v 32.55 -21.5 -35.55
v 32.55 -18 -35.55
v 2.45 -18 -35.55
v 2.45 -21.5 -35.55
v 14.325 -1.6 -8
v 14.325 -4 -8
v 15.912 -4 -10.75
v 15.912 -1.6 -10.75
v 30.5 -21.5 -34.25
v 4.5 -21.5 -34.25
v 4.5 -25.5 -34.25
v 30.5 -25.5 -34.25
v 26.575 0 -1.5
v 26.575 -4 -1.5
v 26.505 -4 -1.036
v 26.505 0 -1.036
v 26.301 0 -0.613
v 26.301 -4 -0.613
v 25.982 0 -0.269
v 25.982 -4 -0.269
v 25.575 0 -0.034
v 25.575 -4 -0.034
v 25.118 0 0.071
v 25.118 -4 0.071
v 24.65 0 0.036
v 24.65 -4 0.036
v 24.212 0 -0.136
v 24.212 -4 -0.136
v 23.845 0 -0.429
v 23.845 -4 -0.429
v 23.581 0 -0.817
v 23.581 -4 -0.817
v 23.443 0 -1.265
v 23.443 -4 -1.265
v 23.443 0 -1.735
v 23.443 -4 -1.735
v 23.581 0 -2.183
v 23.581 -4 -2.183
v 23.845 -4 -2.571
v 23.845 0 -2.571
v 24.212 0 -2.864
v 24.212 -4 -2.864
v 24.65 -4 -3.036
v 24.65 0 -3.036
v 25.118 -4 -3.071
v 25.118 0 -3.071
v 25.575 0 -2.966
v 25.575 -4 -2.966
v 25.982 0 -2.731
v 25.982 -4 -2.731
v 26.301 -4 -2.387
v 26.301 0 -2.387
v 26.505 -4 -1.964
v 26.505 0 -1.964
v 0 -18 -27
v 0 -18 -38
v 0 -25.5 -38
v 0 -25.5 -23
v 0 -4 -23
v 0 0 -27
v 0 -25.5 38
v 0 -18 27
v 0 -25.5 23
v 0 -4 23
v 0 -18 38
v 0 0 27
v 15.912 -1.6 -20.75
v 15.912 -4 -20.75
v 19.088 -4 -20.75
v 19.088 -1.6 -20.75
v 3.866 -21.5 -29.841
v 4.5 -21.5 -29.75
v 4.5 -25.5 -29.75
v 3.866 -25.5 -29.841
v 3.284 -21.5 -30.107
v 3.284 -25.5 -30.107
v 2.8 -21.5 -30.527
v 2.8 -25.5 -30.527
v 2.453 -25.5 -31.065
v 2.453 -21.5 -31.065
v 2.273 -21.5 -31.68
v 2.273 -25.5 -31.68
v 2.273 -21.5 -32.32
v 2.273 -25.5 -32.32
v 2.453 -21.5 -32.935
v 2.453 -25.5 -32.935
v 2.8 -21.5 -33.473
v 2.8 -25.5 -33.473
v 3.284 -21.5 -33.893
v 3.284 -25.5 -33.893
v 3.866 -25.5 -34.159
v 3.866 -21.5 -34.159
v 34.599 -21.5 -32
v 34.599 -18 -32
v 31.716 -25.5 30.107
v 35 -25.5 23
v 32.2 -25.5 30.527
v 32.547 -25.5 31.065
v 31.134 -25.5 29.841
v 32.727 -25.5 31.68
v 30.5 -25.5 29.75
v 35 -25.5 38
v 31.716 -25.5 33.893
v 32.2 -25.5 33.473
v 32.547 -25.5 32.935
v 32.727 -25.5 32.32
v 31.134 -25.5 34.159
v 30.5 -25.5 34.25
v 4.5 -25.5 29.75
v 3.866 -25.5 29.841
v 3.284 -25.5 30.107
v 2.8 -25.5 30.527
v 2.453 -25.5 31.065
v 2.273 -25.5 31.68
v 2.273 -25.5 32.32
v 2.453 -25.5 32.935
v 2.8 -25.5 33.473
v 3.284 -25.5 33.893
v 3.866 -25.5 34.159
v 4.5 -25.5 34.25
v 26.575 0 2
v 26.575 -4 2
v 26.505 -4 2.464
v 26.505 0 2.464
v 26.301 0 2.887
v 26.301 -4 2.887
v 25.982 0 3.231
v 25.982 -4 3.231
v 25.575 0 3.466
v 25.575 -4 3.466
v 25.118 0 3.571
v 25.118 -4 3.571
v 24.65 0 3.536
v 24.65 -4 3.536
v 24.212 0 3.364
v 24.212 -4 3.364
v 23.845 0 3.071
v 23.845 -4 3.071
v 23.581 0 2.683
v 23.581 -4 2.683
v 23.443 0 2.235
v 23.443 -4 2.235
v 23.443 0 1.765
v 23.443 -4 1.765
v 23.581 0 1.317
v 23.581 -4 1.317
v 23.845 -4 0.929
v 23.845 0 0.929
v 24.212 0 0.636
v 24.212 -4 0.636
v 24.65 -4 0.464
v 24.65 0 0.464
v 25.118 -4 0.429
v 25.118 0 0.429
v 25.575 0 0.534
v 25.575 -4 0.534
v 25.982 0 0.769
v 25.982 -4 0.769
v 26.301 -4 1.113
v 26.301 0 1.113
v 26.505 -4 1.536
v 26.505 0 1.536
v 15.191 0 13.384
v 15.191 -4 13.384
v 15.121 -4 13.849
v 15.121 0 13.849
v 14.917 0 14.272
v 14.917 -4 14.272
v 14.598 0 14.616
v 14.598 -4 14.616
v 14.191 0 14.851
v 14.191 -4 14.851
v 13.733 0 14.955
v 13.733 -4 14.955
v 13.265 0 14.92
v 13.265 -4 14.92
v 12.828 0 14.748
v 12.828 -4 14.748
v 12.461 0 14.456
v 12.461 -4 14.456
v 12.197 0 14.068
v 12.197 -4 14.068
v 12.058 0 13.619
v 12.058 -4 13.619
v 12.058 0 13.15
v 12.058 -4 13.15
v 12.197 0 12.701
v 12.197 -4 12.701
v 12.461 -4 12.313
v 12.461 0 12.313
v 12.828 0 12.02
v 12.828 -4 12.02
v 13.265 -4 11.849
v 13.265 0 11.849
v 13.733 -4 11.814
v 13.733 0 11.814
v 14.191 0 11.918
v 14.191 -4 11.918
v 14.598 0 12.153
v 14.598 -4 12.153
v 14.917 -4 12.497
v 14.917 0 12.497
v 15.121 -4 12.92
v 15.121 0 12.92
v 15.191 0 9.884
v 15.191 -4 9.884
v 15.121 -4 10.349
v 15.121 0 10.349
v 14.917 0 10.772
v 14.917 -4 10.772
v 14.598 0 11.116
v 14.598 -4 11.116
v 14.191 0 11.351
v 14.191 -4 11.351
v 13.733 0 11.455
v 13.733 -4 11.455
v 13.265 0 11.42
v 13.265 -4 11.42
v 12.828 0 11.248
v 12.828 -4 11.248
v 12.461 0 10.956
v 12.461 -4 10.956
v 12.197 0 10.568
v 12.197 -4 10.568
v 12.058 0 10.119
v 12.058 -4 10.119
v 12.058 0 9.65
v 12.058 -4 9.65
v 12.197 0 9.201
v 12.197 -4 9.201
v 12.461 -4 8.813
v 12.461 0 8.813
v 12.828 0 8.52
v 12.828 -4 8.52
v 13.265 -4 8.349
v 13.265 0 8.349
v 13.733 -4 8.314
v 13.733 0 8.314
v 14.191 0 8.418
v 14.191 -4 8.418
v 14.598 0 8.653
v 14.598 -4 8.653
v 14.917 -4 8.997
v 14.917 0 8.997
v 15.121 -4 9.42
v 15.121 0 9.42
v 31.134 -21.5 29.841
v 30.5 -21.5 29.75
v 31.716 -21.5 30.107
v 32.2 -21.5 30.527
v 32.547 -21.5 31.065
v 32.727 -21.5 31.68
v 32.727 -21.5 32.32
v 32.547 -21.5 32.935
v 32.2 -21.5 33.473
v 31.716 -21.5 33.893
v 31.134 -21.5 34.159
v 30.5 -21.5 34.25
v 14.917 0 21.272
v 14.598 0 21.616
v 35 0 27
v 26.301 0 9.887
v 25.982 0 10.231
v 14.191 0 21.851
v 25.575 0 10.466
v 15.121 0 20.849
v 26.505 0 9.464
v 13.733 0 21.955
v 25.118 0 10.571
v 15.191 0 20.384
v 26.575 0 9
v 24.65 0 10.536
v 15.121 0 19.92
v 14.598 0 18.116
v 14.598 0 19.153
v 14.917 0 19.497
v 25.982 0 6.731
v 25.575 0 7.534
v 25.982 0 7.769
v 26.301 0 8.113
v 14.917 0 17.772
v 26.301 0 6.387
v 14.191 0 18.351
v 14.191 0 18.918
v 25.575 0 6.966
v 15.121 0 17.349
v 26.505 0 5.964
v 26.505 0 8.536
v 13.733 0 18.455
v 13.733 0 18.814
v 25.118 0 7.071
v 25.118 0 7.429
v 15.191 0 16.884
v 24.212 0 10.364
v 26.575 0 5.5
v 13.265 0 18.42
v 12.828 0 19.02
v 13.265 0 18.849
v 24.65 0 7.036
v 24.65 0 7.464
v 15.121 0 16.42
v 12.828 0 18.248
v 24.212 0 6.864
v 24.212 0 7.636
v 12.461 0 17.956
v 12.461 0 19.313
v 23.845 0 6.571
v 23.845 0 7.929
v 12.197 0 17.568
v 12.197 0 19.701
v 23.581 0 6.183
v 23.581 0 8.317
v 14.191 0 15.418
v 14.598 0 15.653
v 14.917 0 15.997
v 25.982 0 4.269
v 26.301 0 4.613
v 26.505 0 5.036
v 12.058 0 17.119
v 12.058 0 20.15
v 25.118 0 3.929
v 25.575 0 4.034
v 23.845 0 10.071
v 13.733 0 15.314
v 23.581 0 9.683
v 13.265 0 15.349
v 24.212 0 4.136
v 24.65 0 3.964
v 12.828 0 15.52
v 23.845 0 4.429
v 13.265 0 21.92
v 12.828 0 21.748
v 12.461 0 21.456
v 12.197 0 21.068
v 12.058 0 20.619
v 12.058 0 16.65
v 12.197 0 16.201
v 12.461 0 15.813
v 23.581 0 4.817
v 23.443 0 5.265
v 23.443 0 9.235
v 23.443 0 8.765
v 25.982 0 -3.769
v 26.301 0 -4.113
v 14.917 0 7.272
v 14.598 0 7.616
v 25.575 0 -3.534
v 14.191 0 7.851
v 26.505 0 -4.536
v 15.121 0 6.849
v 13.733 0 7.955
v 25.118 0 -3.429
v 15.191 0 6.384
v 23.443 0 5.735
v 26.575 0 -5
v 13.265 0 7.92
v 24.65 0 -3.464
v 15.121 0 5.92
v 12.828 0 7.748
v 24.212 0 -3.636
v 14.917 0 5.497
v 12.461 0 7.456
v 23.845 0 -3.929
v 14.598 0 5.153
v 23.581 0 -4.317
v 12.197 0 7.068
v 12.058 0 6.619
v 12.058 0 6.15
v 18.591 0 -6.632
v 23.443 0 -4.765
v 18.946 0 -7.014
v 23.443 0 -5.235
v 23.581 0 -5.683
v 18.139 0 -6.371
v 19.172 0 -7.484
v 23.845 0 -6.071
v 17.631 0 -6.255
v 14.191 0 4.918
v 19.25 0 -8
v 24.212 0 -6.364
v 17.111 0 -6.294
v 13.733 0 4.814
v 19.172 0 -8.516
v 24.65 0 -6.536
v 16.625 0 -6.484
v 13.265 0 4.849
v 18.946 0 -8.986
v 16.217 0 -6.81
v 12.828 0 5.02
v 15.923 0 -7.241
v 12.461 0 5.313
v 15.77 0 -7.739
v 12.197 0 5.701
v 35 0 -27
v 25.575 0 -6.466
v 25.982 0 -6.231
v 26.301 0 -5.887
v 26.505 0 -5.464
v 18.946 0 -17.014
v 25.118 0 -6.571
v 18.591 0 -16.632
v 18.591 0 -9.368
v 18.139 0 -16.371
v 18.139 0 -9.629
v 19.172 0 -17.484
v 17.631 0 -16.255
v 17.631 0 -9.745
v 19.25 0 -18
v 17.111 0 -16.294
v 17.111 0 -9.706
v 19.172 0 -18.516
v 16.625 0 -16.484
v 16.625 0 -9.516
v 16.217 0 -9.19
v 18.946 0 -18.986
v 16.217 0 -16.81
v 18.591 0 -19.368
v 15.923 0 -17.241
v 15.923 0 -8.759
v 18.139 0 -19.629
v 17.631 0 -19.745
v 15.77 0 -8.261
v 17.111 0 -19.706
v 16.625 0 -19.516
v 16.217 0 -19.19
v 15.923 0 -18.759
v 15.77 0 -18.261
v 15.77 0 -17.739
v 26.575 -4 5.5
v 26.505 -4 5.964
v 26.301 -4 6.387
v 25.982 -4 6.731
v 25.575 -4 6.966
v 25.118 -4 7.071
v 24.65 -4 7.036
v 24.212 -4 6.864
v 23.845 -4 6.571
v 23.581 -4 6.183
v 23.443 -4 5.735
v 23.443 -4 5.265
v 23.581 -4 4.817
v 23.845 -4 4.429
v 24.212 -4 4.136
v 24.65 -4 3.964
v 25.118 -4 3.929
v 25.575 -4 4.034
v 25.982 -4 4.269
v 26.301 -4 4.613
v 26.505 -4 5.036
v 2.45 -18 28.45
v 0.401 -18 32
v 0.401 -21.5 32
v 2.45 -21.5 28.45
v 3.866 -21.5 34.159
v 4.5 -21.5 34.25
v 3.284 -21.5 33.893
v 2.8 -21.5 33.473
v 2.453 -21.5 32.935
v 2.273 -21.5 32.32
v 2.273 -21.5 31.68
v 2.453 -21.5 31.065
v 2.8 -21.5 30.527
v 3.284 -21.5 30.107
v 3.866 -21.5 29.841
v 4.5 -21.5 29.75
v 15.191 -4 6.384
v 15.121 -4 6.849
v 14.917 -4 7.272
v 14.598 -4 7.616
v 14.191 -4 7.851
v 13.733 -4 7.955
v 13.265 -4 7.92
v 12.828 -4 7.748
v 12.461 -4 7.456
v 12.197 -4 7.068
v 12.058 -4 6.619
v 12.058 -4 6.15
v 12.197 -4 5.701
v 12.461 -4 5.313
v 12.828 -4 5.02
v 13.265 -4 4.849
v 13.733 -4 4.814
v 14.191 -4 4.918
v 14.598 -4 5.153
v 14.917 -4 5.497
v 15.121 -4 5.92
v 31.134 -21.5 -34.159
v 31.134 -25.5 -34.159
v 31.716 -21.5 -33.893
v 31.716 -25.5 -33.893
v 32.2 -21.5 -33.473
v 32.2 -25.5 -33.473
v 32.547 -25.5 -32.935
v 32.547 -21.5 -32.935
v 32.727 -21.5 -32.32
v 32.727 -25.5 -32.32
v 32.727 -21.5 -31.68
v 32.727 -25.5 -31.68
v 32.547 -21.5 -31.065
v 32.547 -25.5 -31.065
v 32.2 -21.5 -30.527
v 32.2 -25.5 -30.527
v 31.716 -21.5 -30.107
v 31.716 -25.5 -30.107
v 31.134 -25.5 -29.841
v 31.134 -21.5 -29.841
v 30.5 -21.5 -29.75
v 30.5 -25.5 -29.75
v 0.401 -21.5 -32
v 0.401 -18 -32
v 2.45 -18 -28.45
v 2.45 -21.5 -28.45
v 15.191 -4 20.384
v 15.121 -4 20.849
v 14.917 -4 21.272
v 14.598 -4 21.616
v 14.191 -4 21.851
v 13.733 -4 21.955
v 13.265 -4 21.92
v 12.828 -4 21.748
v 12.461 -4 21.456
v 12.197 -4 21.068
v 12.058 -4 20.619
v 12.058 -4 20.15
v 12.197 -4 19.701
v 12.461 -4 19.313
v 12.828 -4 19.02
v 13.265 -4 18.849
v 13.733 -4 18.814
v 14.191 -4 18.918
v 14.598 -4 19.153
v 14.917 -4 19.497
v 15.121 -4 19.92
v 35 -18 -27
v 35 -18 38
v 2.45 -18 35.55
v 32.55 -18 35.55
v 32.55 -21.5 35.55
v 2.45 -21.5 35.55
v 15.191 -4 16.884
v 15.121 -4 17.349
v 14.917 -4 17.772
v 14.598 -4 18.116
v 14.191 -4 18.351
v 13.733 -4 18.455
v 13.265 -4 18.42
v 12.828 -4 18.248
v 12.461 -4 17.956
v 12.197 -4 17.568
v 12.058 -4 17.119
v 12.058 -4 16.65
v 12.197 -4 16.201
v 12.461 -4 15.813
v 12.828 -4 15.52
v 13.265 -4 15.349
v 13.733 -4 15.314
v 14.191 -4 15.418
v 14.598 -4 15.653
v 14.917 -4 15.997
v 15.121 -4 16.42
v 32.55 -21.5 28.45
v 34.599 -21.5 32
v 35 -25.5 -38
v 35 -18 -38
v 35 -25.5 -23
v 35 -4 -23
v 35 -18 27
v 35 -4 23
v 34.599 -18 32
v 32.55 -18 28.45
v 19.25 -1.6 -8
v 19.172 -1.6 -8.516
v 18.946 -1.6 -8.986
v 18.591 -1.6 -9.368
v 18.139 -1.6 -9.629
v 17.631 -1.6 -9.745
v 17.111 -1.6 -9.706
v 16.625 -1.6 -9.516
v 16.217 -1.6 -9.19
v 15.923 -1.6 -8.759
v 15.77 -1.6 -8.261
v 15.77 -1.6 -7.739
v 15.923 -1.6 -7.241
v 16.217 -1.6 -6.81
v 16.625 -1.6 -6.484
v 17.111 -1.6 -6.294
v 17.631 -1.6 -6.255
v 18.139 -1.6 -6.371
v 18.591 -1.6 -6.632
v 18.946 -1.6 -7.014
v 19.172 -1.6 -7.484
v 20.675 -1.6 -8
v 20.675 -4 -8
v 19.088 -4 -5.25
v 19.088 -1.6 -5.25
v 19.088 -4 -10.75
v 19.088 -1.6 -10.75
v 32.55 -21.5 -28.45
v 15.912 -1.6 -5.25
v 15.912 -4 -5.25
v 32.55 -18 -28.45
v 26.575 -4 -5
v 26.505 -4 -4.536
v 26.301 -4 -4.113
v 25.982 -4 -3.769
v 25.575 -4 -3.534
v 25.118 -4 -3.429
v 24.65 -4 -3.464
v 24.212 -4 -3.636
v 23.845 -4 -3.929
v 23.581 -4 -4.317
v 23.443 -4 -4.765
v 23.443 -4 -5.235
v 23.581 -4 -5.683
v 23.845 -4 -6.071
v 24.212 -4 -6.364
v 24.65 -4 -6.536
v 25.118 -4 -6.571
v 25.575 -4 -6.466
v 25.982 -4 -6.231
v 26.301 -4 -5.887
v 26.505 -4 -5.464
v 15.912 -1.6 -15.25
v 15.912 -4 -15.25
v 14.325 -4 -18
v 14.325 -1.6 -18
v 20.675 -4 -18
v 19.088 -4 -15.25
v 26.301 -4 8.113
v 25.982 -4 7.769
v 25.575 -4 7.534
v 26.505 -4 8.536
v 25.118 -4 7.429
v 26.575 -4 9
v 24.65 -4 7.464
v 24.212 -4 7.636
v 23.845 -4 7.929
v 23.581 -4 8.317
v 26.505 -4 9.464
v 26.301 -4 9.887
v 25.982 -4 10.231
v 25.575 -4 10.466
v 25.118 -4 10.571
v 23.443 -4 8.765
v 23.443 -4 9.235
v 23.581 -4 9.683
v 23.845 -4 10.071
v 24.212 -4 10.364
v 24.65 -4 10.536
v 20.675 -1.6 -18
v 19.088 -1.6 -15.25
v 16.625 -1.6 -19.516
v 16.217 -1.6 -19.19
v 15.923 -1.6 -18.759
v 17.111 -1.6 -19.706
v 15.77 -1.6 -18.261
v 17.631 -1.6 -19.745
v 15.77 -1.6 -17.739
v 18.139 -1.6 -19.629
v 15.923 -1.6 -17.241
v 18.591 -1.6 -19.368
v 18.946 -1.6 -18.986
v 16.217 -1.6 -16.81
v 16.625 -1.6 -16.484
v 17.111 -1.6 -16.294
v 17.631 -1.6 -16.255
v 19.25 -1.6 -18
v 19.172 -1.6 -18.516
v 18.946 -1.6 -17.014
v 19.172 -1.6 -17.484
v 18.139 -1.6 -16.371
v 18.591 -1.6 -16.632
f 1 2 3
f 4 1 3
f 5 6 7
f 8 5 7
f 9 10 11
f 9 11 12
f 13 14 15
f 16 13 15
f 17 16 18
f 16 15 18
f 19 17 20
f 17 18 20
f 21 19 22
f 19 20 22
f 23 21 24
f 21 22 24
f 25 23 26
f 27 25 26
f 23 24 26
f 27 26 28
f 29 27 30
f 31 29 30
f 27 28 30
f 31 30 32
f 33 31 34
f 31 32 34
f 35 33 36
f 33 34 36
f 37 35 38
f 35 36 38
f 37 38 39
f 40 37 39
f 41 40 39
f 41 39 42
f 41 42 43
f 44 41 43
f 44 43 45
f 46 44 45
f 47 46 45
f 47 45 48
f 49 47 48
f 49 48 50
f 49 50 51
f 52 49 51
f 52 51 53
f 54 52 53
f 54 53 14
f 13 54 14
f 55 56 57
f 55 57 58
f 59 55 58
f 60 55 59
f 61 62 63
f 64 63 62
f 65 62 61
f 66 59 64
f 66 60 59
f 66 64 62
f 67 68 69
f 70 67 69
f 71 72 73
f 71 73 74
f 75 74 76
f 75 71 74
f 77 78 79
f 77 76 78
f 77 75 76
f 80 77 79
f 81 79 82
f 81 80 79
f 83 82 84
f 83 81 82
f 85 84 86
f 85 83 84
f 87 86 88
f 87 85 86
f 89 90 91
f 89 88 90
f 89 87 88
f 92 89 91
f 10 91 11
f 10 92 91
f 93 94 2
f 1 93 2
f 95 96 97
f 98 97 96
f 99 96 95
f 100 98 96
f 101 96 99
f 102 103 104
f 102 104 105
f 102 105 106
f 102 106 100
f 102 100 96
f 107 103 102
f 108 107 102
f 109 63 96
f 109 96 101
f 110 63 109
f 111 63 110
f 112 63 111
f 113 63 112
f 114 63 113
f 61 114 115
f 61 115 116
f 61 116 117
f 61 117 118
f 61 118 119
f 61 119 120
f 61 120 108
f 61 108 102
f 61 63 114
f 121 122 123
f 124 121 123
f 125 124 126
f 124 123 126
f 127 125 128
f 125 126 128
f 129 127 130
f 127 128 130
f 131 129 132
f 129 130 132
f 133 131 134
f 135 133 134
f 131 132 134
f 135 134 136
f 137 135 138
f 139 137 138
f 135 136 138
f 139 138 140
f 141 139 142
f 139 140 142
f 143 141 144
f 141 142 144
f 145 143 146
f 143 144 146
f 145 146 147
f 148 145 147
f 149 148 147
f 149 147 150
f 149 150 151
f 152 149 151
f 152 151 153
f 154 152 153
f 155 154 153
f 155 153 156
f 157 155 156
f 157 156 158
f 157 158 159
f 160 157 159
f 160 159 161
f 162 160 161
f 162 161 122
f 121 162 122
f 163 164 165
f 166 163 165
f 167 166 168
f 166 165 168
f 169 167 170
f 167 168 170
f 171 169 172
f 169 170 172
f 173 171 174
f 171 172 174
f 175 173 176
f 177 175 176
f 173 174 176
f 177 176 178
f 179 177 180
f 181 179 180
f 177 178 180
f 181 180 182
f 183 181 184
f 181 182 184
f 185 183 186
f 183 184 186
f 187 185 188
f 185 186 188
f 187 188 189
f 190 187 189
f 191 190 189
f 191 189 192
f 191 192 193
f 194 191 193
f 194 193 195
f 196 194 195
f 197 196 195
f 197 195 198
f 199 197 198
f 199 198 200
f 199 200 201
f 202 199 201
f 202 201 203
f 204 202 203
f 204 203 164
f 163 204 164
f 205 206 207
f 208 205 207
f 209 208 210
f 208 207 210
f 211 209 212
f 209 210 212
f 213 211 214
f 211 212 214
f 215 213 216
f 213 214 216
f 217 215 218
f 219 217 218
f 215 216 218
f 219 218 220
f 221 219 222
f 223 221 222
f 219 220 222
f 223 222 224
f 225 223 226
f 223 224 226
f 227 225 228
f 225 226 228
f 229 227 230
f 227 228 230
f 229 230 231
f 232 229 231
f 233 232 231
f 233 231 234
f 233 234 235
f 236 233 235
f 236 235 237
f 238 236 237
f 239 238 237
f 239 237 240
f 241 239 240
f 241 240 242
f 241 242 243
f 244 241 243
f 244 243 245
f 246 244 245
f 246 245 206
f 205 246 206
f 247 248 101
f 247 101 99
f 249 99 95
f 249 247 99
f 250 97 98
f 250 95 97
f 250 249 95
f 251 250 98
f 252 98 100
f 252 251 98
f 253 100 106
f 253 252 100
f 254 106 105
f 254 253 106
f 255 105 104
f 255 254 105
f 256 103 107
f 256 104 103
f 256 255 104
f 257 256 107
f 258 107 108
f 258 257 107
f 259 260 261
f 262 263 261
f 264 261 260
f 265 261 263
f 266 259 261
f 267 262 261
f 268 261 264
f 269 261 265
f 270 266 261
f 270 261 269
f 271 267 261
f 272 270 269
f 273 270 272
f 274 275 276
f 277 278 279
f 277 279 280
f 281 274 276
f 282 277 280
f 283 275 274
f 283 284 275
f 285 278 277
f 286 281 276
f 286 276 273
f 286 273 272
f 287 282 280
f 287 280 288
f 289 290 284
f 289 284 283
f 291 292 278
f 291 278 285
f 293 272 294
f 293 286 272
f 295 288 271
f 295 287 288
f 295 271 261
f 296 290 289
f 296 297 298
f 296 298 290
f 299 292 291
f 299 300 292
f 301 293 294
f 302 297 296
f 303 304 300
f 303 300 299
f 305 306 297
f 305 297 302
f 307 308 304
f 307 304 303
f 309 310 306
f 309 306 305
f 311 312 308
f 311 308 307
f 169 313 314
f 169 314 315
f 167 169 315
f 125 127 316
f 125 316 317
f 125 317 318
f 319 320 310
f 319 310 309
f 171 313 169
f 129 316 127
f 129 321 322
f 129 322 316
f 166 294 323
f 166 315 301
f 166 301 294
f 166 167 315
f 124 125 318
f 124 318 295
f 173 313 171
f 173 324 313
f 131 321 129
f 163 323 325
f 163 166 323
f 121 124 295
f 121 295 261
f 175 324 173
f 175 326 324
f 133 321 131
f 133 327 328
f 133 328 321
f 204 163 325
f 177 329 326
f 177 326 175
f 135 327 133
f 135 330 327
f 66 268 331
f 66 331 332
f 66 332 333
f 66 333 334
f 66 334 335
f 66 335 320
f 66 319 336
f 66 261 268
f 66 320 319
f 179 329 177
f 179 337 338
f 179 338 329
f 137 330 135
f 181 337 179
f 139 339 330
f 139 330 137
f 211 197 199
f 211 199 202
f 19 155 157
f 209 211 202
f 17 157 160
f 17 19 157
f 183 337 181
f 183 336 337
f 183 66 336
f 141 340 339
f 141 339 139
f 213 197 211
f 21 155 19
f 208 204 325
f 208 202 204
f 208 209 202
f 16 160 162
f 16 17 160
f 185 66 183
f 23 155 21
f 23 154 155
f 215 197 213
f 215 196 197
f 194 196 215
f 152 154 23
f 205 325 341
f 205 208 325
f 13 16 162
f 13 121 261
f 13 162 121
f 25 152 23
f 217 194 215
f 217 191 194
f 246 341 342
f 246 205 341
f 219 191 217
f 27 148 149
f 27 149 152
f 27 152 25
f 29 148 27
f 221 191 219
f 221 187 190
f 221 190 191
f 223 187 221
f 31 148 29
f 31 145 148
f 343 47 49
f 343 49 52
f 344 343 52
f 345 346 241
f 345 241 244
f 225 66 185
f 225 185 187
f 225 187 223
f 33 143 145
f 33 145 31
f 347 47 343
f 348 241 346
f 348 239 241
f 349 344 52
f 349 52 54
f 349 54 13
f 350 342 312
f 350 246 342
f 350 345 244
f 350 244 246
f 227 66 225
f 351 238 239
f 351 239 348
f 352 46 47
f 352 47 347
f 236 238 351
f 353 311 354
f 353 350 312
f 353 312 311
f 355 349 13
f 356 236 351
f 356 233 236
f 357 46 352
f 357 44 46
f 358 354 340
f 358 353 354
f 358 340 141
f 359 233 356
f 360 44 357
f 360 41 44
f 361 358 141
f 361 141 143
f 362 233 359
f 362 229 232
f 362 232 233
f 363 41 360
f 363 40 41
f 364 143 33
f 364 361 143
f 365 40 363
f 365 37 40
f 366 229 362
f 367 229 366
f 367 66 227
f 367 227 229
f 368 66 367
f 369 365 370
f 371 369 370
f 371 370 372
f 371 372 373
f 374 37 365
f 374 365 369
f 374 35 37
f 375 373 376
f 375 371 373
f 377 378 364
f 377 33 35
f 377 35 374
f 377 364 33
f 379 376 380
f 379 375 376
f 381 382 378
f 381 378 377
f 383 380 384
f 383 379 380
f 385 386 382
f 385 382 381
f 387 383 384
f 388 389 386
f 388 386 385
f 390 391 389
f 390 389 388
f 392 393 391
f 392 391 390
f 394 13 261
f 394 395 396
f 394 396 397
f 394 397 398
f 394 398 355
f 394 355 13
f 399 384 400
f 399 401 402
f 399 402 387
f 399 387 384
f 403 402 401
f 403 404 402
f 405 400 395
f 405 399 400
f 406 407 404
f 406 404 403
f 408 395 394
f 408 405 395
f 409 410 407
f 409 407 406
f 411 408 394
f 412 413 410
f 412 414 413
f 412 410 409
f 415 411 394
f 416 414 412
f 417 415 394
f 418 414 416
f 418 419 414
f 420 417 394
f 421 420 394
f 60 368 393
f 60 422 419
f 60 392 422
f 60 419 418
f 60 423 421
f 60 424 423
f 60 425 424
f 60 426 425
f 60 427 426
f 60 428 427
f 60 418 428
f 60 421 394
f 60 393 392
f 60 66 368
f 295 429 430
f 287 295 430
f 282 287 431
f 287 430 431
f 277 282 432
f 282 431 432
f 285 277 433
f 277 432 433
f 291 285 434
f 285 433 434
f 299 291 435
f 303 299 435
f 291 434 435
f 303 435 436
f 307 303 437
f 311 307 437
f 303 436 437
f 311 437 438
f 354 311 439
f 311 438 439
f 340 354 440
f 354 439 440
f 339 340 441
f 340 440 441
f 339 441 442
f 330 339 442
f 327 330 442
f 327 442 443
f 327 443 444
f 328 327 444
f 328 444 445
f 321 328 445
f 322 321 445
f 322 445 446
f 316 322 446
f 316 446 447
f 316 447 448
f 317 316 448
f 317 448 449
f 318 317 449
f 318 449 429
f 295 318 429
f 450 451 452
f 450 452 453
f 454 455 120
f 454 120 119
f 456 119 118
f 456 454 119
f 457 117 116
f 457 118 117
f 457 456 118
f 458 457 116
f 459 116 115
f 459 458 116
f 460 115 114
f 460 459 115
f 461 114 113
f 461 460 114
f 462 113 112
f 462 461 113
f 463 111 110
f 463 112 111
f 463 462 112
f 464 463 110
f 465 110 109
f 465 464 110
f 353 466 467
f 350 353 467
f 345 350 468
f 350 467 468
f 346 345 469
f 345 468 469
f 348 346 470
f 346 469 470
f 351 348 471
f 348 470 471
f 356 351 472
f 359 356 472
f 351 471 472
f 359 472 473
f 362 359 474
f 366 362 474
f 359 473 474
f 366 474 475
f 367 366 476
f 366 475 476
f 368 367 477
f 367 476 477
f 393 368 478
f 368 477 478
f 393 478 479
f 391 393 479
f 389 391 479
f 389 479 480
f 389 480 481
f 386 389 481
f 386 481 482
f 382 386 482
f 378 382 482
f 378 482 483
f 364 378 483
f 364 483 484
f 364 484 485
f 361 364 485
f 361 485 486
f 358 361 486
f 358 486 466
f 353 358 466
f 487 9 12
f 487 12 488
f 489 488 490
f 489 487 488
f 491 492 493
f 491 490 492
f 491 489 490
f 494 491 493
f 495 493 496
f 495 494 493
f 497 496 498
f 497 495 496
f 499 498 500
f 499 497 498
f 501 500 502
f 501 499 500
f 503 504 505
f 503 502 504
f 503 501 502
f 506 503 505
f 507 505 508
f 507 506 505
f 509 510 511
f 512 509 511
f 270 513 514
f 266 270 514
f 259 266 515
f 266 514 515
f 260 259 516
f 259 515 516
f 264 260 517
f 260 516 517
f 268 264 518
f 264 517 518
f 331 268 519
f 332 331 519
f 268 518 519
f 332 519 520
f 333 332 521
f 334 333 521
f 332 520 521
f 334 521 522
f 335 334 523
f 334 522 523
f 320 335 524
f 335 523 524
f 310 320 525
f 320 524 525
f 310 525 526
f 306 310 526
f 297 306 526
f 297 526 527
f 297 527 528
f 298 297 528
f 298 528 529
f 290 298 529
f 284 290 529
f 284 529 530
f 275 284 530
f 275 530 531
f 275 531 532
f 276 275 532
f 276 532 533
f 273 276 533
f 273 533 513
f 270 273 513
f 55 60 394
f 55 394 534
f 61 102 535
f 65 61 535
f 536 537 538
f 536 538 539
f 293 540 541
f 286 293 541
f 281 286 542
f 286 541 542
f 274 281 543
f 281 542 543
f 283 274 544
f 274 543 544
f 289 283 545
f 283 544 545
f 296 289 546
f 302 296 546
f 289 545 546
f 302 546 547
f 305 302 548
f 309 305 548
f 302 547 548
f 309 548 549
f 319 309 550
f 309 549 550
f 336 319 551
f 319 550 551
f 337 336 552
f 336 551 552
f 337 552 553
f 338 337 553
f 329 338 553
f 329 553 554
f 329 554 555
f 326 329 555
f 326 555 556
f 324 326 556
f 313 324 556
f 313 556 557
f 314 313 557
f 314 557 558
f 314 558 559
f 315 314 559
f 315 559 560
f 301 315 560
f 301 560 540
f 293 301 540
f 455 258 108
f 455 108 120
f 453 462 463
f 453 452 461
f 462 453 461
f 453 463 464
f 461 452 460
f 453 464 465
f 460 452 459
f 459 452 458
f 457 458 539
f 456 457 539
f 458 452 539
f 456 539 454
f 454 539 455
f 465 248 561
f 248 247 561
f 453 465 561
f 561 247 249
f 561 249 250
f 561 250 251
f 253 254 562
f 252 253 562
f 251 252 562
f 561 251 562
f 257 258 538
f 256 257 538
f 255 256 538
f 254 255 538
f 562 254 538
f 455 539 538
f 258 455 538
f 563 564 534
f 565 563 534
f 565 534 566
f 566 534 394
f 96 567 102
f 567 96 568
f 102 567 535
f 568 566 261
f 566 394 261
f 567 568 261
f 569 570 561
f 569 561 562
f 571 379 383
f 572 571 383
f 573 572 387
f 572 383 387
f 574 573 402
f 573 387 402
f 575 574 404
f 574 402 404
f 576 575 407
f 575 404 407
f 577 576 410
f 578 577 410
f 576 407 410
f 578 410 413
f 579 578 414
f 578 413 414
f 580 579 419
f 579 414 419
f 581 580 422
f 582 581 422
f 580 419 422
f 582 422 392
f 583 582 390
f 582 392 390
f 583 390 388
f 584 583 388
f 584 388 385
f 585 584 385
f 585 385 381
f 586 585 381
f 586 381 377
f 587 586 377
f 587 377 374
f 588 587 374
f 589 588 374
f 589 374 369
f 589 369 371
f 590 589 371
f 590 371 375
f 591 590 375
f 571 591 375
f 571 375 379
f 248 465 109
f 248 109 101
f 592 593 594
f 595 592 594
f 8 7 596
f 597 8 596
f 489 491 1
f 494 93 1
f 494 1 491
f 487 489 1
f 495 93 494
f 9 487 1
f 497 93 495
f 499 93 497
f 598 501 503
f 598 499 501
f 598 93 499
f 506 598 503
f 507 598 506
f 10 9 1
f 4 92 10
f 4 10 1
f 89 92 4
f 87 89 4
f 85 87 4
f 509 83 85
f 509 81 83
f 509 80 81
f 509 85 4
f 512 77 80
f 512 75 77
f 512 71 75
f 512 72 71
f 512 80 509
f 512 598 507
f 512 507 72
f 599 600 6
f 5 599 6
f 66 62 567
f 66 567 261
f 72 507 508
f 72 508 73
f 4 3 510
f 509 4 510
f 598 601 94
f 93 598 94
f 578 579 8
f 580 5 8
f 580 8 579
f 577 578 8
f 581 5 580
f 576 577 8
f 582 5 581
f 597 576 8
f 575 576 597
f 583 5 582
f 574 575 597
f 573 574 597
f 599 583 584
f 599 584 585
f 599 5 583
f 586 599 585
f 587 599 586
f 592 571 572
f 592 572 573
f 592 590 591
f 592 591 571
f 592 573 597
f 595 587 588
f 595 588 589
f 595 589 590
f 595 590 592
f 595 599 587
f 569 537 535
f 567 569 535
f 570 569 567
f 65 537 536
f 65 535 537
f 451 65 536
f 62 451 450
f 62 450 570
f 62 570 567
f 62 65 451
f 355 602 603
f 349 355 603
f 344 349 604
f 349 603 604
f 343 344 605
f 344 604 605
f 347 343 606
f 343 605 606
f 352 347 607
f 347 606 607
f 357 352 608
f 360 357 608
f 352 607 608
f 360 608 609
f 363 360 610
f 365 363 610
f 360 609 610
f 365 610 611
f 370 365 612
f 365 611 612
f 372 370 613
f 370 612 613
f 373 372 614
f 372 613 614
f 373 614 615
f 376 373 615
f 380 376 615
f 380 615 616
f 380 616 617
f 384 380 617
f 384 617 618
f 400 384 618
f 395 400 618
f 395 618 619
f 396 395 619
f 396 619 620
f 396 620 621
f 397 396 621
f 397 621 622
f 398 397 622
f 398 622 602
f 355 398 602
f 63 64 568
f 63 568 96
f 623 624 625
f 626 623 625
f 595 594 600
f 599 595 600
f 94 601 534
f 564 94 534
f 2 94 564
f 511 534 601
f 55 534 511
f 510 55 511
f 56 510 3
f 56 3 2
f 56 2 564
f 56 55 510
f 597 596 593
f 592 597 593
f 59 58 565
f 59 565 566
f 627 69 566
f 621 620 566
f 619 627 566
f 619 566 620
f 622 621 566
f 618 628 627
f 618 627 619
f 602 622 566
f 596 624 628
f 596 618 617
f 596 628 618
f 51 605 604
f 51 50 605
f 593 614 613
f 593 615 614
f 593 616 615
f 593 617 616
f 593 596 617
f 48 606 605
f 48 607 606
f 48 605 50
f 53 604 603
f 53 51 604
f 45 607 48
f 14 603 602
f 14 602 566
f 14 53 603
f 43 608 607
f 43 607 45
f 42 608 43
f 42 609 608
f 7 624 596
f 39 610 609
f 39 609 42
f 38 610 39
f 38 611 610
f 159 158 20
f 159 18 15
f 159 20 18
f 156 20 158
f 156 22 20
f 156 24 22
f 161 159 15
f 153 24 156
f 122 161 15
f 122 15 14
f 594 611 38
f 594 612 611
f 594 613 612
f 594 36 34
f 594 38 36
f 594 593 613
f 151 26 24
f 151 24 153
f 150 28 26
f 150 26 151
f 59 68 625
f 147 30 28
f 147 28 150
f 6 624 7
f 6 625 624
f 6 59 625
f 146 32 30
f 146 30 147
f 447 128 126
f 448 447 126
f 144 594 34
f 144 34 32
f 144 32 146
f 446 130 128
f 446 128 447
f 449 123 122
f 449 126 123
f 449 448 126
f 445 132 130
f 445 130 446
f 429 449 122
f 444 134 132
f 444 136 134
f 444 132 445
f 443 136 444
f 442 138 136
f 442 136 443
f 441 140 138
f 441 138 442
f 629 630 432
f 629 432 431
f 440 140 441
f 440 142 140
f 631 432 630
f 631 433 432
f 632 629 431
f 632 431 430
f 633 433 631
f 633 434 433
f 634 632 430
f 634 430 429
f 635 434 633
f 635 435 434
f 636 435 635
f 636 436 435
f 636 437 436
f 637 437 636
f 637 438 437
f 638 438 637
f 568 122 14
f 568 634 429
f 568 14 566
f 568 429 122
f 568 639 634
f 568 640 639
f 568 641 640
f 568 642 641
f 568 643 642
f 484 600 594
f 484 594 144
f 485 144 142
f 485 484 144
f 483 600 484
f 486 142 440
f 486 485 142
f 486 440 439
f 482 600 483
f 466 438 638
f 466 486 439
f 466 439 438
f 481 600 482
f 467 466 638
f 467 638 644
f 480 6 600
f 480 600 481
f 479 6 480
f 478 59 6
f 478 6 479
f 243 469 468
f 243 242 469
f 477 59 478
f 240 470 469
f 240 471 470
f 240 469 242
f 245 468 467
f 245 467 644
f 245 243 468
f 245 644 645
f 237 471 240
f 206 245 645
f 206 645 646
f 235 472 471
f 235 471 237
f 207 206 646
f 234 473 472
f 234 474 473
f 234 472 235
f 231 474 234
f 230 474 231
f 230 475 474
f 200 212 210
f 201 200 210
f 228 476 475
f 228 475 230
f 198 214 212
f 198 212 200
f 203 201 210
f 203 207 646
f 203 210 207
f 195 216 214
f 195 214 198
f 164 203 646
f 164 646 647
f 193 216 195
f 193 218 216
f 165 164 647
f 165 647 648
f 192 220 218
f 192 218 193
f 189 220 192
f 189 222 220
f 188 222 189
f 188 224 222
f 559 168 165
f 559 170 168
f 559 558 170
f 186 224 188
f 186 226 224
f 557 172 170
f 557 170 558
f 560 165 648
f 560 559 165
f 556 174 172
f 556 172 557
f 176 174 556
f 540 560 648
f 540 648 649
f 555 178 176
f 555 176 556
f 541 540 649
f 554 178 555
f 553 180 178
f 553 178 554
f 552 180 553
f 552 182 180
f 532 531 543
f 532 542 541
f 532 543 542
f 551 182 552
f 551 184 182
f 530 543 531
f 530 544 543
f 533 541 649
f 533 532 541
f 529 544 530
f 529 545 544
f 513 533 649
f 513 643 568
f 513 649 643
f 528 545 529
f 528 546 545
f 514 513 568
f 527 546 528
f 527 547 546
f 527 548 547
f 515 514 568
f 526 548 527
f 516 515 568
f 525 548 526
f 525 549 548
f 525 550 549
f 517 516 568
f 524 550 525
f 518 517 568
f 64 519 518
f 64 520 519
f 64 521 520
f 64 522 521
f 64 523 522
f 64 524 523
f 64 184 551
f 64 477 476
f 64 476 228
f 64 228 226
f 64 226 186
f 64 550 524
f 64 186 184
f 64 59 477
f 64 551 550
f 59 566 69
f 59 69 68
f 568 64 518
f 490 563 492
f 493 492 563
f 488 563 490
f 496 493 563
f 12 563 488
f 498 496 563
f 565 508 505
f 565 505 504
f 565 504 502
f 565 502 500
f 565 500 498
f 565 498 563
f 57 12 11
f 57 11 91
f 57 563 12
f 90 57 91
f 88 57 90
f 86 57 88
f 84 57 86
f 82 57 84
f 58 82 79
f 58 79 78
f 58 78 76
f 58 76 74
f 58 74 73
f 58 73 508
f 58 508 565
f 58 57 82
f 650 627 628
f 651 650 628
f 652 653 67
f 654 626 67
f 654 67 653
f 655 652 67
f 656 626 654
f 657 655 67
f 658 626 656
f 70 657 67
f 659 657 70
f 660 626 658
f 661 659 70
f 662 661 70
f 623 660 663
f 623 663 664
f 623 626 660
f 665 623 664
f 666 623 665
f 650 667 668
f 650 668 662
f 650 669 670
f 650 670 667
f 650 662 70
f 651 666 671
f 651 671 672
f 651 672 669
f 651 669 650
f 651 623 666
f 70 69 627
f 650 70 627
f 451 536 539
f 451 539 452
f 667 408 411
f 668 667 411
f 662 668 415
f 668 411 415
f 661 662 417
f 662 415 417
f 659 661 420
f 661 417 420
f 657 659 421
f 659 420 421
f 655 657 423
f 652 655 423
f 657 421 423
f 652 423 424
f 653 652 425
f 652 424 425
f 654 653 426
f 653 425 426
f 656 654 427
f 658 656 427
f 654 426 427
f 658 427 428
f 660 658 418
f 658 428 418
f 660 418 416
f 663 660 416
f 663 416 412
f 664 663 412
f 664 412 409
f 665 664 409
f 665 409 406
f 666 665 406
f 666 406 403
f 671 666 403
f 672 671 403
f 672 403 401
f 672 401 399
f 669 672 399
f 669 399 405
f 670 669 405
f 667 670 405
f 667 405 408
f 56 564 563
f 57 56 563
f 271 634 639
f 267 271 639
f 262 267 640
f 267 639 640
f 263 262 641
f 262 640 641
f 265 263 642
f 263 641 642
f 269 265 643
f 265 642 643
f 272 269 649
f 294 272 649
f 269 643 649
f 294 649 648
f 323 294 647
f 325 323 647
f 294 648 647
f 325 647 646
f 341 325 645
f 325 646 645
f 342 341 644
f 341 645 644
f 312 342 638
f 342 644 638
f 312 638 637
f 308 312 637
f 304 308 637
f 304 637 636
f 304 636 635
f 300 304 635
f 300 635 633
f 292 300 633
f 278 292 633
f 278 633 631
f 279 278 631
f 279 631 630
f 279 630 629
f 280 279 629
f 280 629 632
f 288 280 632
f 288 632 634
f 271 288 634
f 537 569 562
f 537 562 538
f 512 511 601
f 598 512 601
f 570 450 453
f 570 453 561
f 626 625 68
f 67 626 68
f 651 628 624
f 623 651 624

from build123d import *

# Parameters (mm, degrees)
SALIENTE_EXTRUIR1_DEPTH = 35
CORTAR_EXTRUIR1_DEPTH   = 8.5
CROQUIS3_R              = 1.75
CORTAR_EXTRUIR2_DEPTH   = 26.5
CORTAR_EXTRUIR3_DEPTH   = 2.4
CORTAR_EXTRUIR4_DEPTH   = 3.5
CROQUIS8_R              = 1.575
CORTAR_EXTRUIR6_DEPTH   = 5


with BuildPart() as part:
    # Croquis1 → Saliente-Extruir1 (new body)
    with BuildSketch(Plane(origin=(0, 0, 0), x_dir=(0, 0, -1), z_dir=(1, 0, 0))):
        Polygon((-38, -18), (-27, -18), (-27, 0), (27, 0), (27, -18), (38, -18), (38, -25.5), (23, -25.5), (23, -4), (-23, -4), (-23, -25.5), (-38, -25.5), align=None)
    extrude(amount=SALIENTE_EXTRUIR1_DEPTH)

    # Croquis2 → Cortar-Extruir1 (cut, through all)
    with BuildSketch(Plane(origin=(0, -18, 0), x_dir=(1, 0, 0), z_dir=(0, 1, 0))):
        with BuildLine():
            Line((4.5, 34.25), (30.5, 34.25))
            ThreePointArc((30.5, 34.25), (32.75, 32), (30.5, 29.75))
            Line((30.5, 29.75), (4.5, 29.75))
            ThreePointArc((4.5, 29.75), (2.25, 32), (4.5, 34.25))
        make_face()
        with BuildLine():
            Line((4.5, -29.75), (30.5, -29.75))
            ThreePointArc((30.5, -29.75), (32.75, -32), (30.5, -34.25))
            Line((30.5, -34.25), (4.5, -34.25))
            ThreePointArc((4.5, -34.25), (2.25, -32), (4.5, -29.75))
        make_face()
    extrude(amount=-CORTAR_EXTRUIR1_DEPTH, mode=Mode.SUBTRACT)

    # Croquis3 → Cortar-Extruir2 (cut, through all)
    with BuildSketch(Plane(origin=(0, 0, 0), x_dir=(1, 0, 0), z_dir=(0, 1, 0))):
        with Locations((17.5, 18)):
            Circle(CROQUIS3_R)
        with Locations((17.5, 8)):
            Circle(CROQUIS3_R)
    extrude(amount=-CORTAR_EXTRUIR2_DEPTH, mode=Mode.SUBTRACT)

    # Croquis4 → Cortar-Extruir3 (cut)
    with BuildSketch(Plane.XZ.offset(4)):
        Polygon((20.675426481, -8), (19.08771324, -5.25), (15.91228676, -5.25), (14.324573519, -8), (15.91228676, -10.75), (19.08771324, -10.75), align=None)
        Polygon((20.675426481, -18), (19.08771324, -15.25), (15.91228676, -15.25), (14.324573519, -18), (15.91228676, -20.75), (19.08771324, -20.75), align=None)
    extrude(amount=-CORTAR_EXTRUIR3_DEPTH, mode=Mode.SUBTRACT)

    # Croquis5 → Cortar-Extruir4 (cut)
    with BuildSketch(Plane.XZ.offset(18)):
        Polygon((0.400813089, -32), (2.450406544, -28.45), (32.549593456, -28.45), (34.599186911, -32), (32.549593456, -35.55), (2.450406544, -35.55), align=None)
        Polygon((0.400813089, 32), (2.450406544, 28.45), (32.549593456, 28.45), (34.599186911, 32), (32.549593456, 35.55), (2.450406544, 35.55), align=None)
    extrude(amount=CORTAR_EXTRUIR4_DEPTH, mode=Mode.SUBTRACT)

    # Croquis8 → Cortar-Extruir6 (cut, through all)
    with BuildSketch(Plane.XZ.offset(4)):
        with Locations((25, 9)):
            Circle(CROQUIS8_R)
        with Locations((13.615580823, 20.384419177)):
            Circle(CROQUIS8_R)
        with Locations((13.615580823, 16.884419177)):
            Circle(CROQUIS8_R)
        with Locations((25, 5.5)):
            Circle(CROQUIS8_R)
        with Locations((13.615580823, 13.384419177)):
            Circle(CROQUIS8_R)
        with Locations((25, 2)):
            Circle(CROQUIS8_R)
        with Locations((13.615580823, 9.884419177)):
            Circle(CROQUIS8_R)
        with Locations((25, -1.5)):
            Circle(CROQUIS8_R)
        with Locations((13.615580823, 6.384419177)):
            Circle(CROQUIS8_R)
        with Locations((25, -5)):
            Circle(CROQUIS8_R)
    extrude(amount=-CORTAR_EXTRUIR6_DEPTH, mode=Mode.SUBTRACT)


solid = part.part
